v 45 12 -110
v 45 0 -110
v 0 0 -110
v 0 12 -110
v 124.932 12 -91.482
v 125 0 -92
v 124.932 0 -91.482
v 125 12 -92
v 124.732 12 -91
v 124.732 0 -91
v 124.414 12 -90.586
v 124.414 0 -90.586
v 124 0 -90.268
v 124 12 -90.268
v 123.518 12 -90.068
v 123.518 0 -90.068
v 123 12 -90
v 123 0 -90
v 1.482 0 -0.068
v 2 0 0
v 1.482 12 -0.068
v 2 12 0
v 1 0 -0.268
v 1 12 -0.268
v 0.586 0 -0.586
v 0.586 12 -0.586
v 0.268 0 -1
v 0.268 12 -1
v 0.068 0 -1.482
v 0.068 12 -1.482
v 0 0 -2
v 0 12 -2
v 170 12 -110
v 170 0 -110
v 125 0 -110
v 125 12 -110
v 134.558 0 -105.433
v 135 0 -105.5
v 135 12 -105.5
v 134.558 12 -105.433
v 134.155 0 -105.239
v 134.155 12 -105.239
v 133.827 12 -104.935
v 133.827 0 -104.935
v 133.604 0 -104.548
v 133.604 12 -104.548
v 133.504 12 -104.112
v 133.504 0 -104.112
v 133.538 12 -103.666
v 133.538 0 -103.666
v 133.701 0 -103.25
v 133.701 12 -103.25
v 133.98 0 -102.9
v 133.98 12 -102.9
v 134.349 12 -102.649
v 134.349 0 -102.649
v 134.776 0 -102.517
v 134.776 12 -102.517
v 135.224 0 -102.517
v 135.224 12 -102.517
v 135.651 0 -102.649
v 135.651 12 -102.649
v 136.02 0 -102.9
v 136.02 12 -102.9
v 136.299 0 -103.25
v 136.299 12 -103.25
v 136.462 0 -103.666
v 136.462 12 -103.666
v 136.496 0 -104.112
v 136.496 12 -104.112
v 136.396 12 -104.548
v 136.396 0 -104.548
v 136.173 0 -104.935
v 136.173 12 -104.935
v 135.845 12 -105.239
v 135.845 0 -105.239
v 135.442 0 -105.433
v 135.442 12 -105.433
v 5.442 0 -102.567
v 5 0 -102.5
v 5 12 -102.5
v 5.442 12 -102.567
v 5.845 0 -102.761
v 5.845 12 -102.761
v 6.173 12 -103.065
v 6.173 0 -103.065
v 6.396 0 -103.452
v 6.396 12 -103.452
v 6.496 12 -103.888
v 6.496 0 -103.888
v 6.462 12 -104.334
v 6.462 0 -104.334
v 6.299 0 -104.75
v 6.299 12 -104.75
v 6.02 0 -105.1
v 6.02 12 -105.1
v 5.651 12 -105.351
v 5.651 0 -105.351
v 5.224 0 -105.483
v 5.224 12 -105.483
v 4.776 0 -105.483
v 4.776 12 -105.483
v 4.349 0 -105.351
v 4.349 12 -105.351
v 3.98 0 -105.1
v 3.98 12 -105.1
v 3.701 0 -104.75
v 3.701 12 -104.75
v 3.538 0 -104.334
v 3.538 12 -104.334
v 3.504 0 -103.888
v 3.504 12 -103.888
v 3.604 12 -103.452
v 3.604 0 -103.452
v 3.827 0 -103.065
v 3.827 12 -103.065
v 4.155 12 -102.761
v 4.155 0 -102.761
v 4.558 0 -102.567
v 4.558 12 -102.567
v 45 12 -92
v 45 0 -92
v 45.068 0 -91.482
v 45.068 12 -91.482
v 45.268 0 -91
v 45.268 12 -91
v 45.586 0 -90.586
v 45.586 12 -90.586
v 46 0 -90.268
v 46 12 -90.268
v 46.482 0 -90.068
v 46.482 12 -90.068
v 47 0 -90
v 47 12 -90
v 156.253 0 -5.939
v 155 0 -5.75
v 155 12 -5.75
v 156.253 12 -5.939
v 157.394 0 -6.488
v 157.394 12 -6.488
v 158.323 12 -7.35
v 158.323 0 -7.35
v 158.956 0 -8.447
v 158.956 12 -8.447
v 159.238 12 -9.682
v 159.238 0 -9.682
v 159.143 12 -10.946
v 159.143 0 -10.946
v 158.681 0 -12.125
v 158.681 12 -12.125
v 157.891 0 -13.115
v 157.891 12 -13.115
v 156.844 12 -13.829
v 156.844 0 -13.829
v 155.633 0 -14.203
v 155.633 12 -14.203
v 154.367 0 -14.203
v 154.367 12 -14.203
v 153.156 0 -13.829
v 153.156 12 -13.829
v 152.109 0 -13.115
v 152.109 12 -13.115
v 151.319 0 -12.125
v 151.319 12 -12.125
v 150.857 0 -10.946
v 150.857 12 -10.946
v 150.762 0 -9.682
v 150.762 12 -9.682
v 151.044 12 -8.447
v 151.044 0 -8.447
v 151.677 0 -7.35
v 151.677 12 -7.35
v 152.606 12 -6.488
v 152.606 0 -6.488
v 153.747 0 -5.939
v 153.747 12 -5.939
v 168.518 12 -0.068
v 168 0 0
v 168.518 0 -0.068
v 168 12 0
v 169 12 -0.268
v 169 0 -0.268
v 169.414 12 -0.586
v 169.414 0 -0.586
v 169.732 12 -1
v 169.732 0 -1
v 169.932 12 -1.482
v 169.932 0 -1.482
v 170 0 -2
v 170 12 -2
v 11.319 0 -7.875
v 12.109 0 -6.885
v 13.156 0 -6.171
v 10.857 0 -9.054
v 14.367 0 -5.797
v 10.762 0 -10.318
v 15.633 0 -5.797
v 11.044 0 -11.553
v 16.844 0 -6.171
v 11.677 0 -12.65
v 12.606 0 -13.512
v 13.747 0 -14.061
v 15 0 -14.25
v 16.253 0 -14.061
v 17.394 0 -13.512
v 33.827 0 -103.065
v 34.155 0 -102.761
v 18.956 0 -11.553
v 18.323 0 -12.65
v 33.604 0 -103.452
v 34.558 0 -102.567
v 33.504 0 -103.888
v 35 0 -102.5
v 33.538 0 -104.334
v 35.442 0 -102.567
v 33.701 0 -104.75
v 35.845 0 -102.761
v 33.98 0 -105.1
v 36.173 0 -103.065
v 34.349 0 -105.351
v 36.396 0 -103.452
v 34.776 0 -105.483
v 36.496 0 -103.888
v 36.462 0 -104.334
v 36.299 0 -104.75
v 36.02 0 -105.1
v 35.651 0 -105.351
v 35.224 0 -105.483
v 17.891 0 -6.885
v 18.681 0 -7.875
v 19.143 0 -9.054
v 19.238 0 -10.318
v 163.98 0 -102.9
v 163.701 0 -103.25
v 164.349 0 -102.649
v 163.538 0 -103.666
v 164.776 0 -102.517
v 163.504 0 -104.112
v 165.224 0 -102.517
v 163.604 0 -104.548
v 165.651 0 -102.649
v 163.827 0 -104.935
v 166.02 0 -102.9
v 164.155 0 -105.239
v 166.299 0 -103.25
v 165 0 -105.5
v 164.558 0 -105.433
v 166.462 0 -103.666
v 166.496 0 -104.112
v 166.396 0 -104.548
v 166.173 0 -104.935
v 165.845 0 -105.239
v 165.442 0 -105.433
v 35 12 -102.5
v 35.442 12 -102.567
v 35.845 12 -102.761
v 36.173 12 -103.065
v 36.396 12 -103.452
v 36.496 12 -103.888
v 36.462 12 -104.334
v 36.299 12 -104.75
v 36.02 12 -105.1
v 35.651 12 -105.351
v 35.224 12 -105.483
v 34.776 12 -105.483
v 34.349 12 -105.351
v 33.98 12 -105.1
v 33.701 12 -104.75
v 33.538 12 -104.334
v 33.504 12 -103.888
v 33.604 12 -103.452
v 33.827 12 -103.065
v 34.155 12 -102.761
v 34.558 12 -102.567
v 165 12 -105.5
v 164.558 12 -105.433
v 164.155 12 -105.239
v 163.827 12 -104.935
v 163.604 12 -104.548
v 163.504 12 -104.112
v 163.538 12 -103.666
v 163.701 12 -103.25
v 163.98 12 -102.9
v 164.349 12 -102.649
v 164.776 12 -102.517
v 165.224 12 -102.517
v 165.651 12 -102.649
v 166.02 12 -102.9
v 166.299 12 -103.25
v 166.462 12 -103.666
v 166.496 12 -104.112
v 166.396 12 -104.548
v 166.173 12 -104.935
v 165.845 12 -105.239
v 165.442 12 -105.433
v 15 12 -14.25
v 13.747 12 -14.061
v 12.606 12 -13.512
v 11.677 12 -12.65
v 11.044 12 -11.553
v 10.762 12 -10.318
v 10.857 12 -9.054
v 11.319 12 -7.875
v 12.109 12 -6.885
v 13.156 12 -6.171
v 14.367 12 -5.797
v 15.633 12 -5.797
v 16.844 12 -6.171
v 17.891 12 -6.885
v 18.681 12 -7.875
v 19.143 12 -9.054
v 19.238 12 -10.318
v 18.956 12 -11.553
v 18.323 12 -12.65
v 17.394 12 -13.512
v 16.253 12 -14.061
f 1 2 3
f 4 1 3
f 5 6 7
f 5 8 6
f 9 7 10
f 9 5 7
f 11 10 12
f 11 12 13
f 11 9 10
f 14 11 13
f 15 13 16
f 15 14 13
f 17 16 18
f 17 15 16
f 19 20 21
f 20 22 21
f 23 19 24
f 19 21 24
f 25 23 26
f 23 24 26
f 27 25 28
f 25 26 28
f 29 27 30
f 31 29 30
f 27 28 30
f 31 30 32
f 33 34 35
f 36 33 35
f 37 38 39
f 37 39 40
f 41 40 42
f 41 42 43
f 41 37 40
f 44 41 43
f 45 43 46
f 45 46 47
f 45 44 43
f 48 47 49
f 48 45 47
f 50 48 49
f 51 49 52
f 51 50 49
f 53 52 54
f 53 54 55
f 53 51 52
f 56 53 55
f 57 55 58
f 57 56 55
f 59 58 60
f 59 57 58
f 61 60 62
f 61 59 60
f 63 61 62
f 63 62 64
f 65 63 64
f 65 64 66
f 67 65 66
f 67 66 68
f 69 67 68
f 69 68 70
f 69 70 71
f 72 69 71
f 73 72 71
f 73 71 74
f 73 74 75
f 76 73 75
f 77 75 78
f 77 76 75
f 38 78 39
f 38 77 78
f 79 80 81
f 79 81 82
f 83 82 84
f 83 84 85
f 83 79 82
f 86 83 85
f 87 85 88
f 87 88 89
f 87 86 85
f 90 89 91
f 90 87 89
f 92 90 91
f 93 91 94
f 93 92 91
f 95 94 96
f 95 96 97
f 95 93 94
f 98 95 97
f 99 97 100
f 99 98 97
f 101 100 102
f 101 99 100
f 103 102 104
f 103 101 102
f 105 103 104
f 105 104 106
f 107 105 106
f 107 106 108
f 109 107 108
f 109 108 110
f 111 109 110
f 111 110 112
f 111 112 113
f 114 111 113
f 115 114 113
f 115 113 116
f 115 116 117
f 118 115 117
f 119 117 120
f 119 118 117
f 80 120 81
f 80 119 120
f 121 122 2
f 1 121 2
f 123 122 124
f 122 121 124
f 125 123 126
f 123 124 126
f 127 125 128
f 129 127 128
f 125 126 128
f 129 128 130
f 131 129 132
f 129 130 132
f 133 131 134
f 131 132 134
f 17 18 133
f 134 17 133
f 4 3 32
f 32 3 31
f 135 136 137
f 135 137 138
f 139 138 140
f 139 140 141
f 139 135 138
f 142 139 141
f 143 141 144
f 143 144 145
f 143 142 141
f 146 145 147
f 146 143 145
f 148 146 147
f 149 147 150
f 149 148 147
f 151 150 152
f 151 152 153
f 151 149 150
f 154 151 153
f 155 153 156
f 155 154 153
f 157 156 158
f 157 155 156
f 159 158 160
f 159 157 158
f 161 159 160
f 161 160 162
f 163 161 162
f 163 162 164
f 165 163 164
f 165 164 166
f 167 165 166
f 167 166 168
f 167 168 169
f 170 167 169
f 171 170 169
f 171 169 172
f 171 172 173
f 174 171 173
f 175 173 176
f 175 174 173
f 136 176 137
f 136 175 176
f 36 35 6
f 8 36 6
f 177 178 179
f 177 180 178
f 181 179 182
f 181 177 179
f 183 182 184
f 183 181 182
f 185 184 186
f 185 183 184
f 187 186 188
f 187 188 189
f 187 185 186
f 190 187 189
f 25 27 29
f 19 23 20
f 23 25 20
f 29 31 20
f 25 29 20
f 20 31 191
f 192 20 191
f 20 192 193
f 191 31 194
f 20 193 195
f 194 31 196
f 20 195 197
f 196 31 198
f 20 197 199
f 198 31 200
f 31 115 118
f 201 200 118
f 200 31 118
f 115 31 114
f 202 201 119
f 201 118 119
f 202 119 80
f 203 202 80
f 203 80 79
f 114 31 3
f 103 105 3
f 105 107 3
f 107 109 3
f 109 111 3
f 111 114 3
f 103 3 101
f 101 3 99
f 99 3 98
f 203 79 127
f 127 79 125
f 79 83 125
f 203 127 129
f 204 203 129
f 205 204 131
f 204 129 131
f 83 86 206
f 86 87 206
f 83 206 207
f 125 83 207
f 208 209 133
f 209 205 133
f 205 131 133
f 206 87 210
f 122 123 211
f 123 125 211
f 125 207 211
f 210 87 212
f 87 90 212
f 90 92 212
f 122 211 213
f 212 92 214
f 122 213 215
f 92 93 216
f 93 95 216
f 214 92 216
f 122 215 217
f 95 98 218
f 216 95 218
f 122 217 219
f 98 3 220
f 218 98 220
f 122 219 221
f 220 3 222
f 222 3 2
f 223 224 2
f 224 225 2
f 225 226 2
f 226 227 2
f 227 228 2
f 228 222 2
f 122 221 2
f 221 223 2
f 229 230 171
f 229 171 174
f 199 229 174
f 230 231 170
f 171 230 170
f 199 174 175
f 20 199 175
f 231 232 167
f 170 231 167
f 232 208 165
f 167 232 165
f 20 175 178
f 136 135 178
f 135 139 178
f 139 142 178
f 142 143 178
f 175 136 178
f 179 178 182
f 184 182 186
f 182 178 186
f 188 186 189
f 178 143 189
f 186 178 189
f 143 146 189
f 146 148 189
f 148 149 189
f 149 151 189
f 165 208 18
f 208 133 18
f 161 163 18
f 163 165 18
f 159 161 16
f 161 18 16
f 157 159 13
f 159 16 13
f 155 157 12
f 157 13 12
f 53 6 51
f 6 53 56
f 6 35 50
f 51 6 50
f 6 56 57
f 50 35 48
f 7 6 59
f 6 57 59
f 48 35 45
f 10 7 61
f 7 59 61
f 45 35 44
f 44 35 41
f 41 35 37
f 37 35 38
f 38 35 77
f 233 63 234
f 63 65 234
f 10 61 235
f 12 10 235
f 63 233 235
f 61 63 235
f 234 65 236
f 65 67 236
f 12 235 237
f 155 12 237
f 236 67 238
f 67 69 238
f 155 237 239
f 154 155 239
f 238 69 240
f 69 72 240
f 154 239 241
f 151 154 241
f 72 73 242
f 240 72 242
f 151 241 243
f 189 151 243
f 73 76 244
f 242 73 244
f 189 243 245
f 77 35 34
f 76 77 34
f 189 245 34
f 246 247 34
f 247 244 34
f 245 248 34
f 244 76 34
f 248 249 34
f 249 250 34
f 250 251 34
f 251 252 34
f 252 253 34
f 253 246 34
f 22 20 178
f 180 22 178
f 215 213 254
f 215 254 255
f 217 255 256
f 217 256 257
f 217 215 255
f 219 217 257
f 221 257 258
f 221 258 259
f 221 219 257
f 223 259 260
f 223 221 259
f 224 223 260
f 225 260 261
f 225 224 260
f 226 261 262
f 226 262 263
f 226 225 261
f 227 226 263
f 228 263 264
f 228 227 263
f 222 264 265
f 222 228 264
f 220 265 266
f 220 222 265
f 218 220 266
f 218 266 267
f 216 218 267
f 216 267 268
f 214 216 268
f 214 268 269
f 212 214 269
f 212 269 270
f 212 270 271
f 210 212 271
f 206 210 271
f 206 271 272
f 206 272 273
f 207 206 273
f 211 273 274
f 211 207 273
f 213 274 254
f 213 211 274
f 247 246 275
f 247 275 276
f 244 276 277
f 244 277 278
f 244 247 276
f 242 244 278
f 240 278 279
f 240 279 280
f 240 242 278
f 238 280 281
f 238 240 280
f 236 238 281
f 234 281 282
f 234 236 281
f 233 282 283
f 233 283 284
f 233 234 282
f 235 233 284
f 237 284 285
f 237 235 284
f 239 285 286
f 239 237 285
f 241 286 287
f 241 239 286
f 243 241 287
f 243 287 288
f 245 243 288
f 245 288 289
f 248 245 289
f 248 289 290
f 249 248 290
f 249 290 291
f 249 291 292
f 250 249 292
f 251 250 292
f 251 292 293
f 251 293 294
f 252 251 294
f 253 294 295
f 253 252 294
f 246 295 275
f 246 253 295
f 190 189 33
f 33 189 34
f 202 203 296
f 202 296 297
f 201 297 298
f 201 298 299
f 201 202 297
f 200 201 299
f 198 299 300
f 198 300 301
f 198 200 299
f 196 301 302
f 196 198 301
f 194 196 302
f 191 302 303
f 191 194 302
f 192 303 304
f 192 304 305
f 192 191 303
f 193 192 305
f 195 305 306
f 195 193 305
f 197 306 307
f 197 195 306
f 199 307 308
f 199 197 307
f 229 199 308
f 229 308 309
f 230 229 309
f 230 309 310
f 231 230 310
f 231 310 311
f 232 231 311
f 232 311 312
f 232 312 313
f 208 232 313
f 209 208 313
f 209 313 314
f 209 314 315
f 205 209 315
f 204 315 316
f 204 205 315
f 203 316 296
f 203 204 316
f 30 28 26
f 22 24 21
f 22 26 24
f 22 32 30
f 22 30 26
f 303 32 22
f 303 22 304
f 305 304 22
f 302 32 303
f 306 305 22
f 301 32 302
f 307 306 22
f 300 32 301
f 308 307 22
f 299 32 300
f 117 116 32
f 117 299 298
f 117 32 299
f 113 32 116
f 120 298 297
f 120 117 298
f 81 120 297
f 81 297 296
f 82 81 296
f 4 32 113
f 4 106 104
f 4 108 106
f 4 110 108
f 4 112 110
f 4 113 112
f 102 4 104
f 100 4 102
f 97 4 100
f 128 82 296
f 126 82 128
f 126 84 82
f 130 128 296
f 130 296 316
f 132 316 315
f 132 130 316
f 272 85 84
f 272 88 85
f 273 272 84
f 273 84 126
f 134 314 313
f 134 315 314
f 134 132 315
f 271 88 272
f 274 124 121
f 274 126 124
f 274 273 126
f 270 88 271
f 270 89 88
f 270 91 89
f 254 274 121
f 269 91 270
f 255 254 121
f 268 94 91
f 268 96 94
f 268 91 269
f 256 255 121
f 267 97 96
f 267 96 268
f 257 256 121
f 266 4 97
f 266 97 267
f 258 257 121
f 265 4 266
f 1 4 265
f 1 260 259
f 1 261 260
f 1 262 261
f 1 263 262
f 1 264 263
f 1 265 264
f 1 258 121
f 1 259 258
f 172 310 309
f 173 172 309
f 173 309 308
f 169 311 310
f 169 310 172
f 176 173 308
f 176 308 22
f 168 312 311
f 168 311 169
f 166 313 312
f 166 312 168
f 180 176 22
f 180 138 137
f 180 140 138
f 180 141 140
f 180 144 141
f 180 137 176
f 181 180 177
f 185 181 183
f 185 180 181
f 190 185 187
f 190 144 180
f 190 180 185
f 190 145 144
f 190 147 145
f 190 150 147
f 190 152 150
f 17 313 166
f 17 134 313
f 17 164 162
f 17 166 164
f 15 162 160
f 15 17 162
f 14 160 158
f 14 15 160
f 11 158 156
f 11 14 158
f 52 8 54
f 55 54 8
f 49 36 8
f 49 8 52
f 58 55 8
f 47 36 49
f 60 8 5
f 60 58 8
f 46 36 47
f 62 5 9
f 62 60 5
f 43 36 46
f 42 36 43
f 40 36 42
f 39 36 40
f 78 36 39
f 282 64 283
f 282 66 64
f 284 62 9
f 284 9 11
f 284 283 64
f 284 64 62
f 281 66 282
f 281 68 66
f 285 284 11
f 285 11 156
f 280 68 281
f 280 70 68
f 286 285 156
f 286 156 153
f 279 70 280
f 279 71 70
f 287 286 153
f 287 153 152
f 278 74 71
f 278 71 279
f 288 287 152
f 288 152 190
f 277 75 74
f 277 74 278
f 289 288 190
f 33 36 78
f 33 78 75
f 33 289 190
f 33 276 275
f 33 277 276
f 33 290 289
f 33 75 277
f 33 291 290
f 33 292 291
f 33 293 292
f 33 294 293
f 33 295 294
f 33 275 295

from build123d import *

# Parameters (mm, degrees)
SKETCH1_R           = 4.25
SKETCH1_R_2         = 1.5
BOSS_EXTRUDE1_DEPTH = 12
FILLET1_R           = 2


with BuildPart() as part:
    # Sketch1 → Boss-Extrude1 (new body)
    with BuildSketch(Plane(origin=(0, 0, 0), x_dir=(1, 0, 0), z_dir=(0, 1, 0))):
        Polygon((0, 0), (170, 0), (170, 110), (125, 110), (125, 90), (45, 90), (45, 110), (0, 110), align=None)
        with Locations(Location((155, 10, 0), (0, 0, 270))):
            Circle(SKETCH1_R, mode=Mode.SUBTRACT)
        with Locations(Location((15, 10, 0), (0, 0, 90))):
            Circle(SKETCH1_R, mode=Mode.SUBTRACT)
        with Locations(Location((5, 104, 0), (0, 0, 270))):
            Circle(SKETCH1_R_2, mode=Mode.SUBTRACT)
        with Locations(Location((35, 104, 0), (0, 0, 270))):
            Circle(SKETCH1_R_2, mode=Mode.SUBTRACT)
        with Locations(Location((165, 104, 0), (0, 0, 90))):
            Circle(SKETCH1_R_2, mode=Mode.SUBTRACT)
        with Locations(Location((135, 104, 0), (0, 0, 90))):
            Circle(SKETCH1_R_2, mode=Mode.SUBTRACT)
    extrude(amount=BOSS_EXTRUDE1_DEPTH)

    # Fillet1
    fillet1_edges = [part.edges().sort_by_distance(p)[0] for p in [
        (45, 6, -90),
        (125, 6, -90),
        (170, 6, 0),
        (0, 6, 0),
    ]]
    fillet(fillet1_edges, radius=FILLET1_R)


solid = part.part
